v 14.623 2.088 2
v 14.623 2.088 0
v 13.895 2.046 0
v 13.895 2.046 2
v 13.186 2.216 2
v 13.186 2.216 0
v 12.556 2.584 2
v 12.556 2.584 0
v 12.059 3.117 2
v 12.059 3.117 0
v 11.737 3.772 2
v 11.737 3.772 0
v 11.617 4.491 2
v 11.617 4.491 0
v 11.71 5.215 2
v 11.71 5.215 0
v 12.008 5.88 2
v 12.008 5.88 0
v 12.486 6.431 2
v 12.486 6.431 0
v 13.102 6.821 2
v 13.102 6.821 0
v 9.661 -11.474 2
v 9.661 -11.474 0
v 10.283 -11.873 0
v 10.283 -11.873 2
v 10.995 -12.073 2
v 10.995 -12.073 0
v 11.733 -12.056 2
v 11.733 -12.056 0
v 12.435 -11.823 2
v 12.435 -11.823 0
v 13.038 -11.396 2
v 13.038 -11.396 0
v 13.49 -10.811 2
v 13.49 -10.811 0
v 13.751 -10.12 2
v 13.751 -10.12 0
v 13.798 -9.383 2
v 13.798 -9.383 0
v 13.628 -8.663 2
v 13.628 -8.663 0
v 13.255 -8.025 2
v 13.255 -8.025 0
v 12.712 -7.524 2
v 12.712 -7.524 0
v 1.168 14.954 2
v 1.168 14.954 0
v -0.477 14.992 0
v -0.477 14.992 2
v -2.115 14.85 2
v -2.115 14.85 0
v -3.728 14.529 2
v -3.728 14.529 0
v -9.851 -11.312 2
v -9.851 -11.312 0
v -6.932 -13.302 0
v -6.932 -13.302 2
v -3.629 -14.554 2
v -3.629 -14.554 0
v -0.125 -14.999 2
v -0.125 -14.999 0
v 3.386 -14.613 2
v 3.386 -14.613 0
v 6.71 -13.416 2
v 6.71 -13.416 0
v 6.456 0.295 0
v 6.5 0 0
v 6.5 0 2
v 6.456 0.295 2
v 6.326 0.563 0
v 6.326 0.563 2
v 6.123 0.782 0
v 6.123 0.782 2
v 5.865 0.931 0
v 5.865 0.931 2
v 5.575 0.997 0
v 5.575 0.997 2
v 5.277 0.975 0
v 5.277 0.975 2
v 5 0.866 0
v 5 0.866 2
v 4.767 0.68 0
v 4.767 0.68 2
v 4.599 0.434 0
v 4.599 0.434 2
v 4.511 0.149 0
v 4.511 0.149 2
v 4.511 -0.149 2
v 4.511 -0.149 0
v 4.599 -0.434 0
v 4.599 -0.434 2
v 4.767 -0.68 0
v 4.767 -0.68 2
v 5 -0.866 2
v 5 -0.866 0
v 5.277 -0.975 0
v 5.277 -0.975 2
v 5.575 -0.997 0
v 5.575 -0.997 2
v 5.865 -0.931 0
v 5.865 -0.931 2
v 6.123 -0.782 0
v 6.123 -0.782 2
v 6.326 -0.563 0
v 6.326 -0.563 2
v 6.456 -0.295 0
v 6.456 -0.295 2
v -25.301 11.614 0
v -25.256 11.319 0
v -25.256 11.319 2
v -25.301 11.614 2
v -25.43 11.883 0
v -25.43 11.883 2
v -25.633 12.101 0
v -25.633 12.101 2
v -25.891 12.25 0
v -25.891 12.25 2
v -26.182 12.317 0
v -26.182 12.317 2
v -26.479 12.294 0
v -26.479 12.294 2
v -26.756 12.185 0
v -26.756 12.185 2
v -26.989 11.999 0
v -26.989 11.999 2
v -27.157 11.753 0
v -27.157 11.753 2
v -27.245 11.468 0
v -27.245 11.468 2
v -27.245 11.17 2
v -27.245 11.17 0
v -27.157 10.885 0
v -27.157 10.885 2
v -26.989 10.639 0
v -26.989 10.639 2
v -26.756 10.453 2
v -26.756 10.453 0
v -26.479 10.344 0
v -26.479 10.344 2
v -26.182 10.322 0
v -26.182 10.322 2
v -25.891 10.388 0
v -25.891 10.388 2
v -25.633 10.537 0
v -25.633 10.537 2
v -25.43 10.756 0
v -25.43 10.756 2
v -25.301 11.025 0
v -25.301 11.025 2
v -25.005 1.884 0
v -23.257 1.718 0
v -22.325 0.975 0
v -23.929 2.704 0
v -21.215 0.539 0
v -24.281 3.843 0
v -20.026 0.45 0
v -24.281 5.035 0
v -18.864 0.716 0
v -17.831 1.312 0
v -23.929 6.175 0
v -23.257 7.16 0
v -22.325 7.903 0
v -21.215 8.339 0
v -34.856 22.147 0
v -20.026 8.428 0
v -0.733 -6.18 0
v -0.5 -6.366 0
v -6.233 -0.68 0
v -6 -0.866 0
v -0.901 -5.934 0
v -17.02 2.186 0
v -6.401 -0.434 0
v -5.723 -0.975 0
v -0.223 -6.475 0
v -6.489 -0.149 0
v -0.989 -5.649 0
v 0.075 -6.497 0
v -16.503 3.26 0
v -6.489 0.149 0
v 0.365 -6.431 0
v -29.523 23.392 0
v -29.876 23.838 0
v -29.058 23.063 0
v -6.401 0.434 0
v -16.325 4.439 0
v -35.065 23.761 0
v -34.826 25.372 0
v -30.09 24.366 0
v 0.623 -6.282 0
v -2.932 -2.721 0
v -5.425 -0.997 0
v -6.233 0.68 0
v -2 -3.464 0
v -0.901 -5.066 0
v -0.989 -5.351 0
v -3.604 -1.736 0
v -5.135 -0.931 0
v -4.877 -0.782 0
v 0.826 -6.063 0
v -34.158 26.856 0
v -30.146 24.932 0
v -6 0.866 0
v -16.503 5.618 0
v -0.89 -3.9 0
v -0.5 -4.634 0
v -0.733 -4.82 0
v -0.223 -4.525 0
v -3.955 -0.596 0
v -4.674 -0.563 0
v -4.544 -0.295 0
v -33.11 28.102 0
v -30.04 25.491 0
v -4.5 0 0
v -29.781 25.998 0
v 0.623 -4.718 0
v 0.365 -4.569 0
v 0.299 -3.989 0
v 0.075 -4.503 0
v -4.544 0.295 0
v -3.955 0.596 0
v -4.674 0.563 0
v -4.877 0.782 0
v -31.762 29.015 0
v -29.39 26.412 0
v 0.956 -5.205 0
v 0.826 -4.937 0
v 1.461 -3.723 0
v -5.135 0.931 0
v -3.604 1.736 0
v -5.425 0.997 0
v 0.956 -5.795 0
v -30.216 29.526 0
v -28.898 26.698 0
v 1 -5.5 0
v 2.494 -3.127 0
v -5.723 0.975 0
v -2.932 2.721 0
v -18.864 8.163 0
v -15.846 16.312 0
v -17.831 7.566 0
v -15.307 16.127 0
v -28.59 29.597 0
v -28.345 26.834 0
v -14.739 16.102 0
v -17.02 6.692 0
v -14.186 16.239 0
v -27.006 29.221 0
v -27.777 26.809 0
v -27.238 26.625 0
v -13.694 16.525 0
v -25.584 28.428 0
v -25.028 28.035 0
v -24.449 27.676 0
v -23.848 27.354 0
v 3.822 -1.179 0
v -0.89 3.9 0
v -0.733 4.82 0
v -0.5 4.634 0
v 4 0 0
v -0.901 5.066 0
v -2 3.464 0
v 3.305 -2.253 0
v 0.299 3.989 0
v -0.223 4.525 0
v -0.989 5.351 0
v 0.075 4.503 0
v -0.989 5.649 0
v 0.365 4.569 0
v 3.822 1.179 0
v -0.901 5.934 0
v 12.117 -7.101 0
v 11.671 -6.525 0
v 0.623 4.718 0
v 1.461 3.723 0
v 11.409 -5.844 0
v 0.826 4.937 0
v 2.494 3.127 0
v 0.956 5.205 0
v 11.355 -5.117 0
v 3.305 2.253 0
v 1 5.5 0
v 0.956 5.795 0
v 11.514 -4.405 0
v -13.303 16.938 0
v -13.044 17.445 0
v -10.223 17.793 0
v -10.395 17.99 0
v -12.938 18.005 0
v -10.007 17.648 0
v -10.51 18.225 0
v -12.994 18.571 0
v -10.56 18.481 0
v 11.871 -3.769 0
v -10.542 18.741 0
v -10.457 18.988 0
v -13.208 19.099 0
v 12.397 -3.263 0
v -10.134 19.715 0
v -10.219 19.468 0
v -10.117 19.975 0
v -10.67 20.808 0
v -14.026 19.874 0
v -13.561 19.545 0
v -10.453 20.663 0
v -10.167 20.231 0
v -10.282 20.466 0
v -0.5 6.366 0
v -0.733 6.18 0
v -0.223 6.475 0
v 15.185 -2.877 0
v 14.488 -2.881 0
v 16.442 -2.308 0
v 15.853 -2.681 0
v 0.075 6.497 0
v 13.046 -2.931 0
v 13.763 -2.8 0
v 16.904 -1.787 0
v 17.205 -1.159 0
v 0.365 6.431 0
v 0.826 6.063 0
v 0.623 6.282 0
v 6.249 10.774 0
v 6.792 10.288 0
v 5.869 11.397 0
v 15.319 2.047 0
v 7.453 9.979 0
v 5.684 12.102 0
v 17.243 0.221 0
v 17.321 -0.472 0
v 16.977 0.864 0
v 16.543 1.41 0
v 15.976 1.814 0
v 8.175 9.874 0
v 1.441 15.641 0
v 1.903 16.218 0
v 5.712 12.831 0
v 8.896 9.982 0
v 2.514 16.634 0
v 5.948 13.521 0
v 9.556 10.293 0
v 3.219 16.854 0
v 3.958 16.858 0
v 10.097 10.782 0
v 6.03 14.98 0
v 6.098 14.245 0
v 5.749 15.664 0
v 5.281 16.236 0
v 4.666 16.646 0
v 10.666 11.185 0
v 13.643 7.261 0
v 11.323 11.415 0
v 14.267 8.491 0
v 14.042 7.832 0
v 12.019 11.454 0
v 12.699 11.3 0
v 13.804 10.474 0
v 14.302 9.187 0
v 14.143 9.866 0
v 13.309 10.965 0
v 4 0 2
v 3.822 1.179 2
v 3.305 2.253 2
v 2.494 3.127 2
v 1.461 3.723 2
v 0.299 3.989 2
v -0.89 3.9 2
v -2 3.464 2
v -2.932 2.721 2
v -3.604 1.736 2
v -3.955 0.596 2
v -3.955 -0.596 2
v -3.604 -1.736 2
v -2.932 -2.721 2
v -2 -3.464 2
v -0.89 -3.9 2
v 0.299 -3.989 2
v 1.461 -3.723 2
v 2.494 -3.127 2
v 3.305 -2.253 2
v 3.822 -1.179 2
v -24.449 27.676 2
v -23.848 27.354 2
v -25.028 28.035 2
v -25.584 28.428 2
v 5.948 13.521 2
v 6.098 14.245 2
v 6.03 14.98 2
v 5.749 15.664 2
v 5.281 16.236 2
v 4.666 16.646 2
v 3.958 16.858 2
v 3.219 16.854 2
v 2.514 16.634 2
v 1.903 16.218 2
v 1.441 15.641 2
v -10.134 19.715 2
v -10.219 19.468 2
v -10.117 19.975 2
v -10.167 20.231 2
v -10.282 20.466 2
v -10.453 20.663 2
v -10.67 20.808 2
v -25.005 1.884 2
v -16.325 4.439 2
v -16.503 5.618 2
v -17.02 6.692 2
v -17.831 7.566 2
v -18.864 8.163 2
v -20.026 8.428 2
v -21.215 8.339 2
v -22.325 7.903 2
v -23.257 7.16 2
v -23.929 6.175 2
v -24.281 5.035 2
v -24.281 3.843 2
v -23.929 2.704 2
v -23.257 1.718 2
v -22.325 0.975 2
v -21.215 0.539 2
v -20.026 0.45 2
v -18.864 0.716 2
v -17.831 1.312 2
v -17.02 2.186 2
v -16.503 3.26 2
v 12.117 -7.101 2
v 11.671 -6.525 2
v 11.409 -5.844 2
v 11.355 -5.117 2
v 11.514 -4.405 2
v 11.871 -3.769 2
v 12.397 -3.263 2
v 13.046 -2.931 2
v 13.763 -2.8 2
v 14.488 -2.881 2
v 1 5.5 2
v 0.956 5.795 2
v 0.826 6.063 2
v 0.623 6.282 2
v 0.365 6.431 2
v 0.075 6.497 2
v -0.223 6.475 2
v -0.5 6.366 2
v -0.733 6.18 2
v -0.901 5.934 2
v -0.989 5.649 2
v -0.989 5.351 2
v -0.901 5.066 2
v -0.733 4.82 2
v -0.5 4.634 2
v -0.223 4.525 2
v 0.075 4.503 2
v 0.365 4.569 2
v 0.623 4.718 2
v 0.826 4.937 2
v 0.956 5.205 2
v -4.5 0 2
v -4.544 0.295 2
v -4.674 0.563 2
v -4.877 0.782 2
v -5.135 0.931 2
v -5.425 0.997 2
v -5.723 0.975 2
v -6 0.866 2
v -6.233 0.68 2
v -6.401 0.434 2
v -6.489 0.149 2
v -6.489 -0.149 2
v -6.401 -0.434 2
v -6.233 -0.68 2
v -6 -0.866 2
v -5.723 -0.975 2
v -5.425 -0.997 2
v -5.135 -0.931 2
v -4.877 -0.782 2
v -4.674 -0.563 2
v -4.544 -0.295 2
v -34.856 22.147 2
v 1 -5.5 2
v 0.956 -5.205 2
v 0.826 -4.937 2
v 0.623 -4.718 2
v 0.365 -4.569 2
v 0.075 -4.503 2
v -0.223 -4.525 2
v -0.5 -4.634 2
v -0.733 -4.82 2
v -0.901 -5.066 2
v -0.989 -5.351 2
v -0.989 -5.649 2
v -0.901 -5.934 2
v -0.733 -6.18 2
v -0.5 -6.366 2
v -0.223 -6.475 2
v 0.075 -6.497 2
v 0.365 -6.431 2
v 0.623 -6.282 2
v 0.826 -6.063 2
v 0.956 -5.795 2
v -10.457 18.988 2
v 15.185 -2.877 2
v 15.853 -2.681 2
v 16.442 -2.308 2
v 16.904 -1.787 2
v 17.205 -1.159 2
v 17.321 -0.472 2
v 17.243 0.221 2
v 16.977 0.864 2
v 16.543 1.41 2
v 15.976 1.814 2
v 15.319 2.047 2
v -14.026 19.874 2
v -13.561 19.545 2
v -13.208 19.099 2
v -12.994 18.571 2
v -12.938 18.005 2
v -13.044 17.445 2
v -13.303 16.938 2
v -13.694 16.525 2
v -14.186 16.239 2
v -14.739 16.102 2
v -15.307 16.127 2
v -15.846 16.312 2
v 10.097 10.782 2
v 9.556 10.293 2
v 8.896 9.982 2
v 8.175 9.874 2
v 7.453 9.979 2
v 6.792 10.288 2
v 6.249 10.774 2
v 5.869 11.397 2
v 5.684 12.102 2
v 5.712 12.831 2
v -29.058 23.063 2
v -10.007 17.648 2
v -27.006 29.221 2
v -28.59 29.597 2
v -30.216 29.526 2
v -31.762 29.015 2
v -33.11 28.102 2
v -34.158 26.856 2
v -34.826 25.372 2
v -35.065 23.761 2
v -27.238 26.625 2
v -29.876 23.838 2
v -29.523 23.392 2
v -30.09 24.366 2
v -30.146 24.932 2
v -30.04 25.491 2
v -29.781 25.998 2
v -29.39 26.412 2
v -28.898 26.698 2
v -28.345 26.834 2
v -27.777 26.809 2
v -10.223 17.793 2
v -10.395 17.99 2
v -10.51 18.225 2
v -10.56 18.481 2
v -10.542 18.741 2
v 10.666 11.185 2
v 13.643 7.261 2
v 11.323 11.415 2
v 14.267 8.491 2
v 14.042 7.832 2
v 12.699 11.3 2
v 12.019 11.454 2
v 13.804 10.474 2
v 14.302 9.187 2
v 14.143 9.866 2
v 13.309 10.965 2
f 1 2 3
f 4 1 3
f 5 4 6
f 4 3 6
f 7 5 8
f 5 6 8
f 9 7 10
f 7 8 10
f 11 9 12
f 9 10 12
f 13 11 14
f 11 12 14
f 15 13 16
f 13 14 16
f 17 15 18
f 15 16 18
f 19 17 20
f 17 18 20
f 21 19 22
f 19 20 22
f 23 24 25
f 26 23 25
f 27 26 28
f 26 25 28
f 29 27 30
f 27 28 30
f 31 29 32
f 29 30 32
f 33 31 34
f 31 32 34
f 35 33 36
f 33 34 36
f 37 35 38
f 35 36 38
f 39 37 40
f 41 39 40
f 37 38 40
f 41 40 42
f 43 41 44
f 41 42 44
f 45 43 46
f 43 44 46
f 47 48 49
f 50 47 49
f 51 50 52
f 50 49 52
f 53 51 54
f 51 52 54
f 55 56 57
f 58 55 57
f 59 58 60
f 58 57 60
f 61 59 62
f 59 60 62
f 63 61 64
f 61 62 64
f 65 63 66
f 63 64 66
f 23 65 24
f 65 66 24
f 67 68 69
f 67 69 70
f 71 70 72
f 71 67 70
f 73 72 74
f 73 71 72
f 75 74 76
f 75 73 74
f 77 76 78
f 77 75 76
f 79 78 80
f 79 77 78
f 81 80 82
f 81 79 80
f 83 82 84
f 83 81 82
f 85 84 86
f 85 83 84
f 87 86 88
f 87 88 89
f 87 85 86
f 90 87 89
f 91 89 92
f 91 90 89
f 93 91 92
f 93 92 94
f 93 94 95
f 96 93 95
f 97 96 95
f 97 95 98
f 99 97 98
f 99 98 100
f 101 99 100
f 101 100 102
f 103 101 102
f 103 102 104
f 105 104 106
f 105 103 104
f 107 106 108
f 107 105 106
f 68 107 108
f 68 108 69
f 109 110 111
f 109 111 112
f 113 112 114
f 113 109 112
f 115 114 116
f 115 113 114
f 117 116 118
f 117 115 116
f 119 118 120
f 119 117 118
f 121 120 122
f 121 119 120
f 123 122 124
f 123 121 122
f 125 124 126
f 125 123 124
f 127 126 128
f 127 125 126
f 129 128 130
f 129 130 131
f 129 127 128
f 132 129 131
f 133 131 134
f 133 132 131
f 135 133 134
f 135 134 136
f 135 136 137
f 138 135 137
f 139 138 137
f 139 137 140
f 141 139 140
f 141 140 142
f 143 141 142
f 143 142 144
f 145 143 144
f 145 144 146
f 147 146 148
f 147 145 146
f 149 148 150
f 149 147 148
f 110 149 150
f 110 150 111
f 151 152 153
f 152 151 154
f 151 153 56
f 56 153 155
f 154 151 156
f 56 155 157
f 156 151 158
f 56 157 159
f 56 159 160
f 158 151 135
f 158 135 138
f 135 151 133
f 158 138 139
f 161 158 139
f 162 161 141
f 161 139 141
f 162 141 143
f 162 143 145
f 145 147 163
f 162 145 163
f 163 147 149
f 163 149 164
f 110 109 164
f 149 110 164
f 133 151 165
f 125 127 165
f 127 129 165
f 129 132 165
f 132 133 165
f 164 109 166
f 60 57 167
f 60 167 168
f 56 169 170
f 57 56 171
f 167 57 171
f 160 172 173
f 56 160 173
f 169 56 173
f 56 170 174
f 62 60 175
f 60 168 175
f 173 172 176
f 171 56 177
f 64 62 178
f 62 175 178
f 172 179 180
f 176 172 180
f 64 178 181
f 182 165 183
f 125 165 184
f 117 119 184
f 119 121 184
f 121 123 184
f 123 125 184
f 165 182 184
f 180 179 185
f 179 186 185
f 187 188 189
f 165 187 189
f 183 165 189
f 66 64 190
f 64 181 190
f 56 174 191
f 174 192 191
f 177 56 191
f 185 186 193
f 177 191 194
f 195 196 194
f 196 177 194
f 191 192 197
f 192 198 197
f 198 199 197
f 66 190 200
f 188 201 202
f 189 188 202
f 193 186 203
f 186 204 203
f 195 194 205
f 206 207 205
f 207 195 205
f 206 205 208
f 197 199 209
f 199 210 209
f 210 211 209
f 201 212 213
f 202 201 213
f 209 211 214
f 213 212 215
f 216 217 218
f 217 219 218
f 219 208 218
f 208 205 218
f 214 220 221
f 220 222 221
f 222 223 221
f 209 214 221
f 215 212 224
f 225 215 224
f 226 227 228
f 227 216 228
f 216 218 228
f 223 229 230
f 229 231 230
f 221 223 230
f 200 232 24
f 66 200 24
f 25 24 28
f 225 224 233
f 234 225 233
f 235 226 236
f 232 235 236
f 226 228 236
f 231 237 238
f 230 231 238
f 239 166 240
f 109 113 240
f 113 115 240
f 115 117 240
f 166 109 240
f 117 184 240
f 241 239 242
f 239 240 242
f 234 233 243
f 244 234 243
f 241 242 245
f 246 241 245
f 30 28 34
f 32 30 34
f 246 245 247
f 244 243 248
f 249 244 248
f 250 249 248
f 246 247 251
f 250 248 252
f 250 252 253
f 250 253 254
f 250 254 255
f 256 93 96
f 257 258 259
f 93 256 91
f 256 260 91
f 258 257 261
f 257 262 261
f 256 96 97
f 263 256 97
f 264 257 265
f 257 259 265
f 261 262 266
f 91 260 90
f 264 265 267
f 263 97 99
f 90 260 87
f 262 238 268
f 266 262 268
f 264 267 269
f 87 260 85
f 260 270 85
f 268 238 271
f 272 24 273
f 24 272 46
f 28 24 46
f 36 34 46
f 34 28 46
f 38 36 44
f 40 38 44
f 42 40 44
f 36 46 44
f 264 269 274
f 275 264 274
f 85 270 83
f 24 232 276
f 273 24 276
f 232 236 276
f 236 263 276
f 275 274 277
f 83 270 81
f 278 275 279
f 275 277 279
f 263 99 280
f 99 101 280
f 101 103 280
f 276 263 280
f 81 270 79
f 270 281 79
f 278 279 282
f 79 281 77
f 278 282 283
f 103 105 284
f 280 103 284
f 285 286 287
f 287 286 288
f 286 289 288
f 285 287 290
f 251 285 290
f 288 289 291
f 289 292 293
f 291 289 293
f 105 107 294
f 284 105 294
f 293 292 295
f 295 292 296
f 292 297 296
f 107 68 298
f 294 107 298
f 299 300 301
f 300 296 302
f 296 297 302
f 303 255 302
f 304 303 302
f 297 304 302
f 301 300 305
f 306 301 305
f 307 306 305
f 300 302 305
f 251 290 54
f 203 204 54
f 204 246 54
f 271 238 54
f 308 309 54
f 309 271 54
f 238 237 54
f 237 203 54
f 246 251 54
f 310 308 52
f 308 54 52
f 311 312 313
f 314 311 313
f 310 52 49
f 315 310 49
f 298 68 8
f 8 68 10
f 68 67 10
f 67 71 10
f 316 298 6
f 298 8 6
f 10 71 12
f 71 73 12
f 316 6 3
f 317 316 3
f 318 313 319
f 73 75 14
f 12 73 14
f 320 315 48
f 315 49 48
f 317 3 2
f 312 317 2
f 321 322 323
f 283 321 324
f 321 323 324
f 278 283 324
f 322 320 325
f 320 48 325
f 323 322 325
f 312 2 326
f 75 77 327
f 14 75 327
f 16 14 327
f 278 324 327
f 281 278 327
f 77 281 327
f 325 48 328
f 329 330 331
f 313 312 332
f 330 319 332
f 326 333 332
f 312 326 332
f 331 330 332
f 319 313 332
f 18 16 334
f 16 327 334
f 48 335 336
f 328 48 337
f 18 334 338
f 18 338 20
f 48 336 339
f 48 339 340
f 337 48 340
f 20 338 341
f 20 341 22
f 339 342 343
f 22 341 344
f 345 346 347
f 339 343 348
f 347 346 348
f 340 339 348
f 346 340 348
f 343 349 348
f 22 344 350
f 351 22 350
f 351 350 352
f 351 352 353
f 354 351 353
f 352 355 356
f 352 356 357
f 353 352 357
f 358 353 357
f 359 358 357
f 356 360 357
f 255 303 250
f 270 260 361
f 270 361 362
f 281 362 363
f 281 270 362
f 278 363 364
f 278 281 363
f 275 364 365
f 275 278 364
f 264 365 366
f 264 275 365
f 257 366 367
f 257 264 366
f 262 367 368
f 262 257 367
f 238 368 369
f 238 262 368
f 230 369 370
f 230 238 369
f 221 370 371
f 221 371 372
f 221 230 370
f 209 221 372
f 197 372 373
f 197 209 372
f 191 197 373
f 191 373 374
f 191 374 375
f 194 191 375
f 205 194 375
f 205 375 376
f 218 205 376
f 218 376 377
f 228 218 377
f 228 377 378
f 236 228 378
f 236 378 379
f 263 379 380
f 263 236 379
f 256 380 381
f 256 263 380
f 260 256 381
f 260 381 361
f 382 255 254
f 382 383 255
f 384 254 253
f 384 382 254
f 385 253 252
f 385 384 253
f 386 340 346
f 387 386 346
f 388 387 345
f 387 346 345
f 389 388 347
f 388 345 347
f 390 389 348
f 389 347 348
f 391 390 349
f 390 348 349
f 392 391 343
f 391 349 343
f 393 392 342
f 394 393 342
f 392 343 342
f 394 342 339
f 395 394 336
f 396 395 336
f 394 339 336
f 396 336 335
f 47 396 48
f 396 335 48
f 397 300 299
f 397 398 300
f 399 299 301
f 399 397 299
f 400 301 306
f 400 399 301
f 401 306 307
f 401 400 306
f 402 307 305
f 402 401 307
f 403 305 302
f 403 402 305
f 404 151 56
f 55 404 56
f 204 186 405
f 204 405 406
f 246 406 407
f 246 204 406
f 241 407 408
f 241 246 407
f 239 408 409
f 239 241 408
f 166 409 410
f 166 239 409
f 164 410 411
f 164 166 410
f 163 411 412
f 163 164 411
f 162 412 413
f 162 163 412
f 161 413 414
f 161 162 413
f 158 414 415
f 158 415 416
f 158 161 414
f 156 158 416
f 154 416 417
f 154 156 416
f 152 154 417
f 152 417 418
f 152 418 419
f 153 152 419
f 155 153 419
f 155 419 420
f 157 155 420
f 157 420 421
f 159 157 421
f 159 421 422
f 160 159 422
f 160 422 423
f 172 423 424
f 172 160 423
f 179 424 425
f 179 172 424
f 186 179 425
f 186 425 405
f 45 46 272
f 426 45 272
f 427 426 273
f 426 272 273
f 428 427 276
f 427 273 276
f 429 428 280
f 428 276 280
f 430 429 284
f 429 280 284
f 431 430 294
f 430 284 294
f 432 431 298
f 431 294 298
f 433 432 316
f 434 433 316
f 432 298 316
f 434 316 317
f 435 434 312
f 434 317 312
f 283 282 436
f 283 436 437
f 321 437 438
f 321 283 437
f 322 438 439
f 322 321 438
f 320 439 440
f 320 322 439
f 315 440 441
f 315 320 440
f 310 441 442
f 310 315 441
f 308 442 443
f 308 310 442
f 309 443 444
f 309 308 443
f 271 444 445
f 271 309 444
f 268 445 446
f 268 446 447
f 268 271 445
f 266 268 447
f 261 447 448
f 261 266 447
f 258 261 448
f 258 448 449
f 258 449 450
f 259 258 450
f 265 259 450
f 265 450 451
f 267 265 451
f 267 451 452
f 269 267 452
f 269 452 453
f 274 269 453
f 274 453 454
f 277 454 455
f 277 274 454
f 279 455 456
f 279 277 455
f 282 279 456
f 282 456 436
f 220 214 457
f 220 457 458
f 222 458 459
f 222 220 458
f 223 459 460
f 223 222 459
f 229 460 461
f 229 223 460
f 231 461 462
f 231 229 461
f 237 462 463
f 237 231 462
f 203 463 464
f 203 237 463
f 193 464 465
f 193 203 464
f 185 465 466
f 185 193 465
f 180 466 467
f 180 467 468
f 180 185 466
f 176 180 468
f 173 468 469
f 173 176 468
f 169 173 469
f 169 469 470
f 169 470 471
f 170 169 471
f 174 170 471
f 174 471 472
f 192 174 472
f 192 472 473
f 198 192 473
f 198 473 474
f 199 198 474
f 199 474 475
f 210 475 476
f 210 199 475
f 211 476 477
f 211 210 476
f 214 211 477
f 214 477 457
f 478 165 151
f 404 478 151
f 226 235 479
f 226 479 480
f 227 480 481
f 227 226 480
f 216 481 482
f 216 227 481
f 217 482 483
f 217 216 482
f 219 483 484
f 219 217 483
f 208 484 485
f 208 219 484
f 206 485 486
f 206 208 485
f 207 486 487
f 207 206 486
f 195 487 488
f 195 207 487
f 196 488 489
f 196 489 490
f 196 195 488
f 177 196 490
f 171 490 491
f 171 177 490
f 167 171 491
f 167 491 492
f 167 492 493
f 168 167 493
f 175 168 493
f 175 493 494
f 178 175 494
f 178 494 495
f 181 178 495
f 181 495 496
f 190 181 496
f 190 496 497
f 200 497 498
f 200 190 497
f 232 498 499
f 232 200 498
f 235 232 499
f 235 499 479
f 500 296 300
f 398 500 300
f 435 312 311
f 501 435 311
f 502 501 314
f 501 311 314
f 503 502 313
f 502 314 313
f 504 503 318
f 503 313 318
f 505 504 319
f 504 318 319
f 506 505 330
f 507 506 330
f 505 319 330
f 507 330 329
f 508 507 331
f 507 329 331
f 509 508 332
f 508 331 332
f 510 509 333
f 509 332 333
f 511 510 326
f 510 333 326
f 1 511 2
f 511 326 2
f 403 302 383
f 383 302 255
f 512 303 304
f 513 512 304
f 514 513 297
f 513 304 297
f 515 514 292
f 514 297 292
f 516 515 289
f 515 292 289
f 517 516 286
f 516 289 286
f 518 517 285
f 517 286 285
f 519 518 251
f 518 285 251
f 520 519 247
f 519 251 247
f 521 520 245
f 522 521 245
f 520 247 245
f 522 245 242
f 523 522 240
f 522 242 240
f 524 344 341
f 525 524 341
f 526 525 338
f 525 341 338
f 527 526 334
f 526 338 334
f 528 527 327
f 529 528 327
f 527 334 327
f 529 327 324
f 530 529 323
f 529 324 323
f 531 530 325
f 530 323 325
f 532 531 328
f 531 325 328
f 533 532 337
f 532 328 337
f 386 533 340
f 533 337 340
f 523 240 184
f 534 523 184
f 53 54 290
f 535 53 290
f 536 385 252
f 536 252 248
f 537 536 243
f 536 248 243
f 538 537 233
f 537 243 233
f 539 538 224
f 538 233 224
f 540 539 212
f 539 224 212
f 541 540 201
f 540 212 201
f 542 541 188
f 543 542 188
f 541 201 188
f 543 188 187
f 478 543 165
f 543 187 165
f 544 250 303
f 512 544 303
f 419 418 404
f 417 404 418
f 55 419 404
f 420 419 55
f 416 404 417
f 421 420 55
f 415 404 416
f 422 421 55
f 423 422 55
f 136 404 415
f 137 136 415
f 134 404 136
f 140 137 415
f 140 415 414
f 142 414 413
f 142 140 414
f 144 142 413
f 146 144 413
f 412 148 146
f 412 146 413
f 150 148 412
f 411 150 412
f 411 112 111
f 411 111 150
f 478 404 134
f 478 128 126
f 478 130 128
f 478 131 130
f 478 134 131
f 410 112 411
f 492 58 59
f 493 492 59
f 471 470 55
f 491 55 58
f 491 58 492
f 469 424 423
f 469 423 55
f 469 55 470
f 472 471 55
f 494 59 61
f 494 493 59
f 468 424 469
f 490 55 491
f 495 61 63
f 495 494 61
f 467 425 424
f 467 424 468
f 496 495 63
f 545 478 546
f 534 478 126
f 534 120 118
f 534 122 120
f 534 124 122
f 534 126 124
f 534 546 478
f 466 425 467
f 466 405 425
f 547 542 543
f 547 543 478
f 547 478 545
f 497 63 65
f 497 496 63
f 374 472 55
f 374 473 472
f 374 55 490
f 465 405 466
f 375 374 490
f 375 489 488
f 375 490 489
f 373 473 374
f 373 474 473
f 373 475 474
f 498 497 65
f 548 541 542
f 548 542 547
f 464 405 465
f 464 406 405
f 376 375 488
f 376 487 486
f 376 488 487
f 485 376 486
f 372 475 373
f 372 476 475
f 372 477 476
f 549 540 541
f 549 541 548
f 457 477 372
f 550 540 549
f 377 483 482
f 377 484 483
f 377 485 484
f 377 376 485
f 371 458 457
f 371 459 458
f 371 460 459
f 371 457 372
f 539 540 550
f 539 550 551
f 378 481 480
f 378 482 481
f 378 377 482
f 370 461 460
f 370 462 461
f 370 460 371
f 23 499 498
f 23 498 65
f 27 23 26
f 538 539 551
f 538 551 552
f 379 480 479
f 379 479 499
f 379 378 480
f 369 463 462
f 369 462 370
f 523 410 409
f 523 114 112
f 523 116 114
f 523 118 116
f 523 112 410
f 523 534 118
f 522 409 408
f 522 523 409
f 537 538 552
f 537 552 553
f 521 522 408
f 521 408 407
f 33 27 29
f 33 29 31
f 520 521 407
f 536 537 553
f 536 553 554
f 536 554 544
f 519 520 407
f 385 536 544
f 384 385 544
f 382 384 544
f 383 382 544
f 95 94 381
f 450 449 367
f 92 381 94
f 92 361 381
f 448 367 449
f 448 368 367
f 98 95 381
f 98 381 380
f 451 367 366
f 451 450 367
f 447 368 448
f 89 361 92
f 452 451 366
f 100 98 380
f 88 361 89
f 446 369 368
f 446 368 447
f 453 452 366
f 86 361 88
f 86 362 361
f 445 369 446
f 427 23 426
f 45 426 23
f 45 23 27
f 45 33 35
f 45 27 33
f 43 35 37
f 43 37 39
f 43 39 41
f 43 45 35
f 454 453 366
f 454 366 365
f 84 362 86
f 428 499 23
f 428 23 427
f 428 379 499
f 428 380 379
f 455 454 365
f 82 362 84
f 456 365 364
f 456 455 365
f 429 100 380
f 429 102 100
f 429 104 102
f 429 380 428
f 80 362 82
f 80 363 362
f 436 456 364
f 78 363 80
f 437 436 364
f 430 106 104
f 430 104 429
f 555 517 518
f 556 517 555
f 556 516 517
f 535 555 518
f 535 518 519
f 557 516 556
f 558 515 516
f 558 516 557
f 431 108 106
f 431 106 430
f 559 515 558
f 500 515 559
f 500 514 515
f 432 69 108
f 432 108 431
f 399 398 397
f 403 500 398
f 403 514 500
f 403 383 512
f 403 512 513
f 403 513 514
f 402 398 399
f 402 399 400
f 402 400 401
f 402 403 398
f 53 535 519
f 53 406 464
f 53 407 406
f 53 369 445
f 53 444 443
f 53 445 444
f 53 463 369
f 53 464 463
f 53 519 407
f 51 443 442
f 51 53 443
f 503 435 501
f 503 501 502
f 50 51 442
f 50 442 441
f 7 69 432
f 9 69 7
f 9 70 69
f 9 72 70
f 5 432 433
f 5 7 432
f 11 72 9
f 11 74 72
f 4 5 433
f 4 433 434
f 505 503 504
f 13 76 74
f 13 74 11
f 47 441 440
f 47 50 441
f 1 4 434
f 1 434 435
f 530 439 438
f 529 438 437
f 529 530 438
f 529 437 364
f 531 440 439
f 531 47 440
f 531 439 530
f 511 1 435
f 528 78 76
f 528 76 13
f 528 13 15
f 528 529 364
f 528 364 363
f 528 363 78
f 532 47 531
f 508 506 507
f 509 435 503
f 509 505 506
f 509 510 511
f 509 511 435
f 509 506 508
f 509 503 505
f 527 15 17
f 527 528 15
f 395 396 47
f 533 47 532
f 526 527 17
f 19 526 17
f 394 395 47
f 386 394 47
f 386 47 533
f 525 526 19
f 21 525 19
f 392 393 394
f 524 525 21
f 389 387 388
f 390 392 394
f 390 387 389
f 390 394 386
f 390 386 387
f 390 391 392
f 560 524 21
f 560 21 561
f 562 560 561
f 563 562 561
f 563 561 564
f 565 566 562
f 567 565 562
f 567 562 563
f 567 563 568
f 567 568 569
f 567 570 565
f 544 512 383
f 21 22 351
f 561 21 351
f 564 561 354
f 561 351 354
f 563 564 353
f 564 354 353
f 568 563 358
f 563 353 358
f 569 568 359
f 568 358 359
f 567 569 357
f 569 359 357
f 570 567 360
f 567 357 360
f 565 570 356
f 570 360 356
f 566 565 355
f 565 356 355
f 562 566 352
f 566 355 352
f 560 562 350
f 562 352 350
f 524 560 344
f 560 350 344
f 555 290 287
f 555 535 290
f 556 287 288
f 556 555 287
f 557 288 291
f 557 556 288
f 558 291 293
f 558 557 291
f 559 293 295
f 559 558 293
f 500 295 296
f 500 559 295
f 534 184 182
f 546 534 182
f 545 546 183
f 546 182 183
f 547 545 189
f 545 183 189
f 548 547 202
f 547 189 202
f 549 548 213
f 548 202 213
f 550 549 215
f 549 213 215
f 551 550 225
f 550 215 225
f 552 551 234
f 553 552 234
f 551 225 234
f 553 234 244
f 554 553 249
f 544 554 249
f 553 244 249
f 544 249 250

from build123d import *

# Parameters (mm, degrees)
ESQUISSE1_R        = 4
ESQUISSE1_R_2      = 1
BOSS_EXTRU_1_DEPTH = 2
CONG_1_R           = 1
CONG_2_R           = 11


with BuildPart() as part:
    # Esquisse1 → Boss.-Extru.1 (new body)
    with BuildSketch(Plane.XY):
        with BuildLine():
            Line((-3.728432128, 14.529239273), (-10.902133324, 18.092613259))
            Line((-10.902133324, 18.092613259), (-9.77414371, 20.363455577))
            Line((-9.77414371, 20.363455577), (-25.005281494, 27.929179137))
            ThreePointArc((-25.005281494, 27.929179137), (-32.144223962, 28.809157948), (-34.856074883, 22.146971607))
            Line((-34.856074883, 22.146971607), (-25.005281494, 1.884444499))
            Line((-25.005281494, 1.884444499), (-9.850606554, -11.31218593))
            ThreePointArc((-9.850606554, -11.31218593), (-0.12474397, -14.999481289), (9.661100255, -11.47445606))
            ThreePointArc((9.661100255, -11.47445606), (13.285456142, -11.120563185), (12.711512496, -7.524484146))
            ThreePointArc((12.711512496, -7.524484146), (11.513856086, -4.40486723), (14.487891216, -2.881218443))
            ThreePointArc((14.487891216, -2.881218443), (17.321259352, -0.471730027), (14.623234656, 2.088401251))
            ThreePointArc((14.623234656, 2.088401251), (11.736537034, 3.771662198), (13.102212542, 6.821468911))
            ThreePointArc((13.102212542, 6.821468911), (13.803708164, 10.474072546), (10.097110191, 10.781872629))
            ThreePointArc((10.097110191, 10.781872629), (6.792233583, 10.287725708), (5.948313856, 13.521019705))
            ThreePointArc((5.948313856, 13.521019705), (4.31988032, 16.778227095), (1.167882396, 14.954465912))
            ThreePointArc((1.167882396, 14.954465912), (-1.297808983, 14.94375093), (-3.728432128, 14.529239273))
        make_face()
        with Locations((-20.325227829, 4.439090716)):
            Circle(ESQUISSE1_R, mode=Mode.SUBTRACT)
        with Locations((-26.256387143, 11.319323515)):
            Circle(ESQUISSE1_R_2, mode=Mode.SUBTRACT)
        with BuildLine():
            ThreePointArc((-29.058075564, 23.063121212), (-29.928943128, 25.754141406), (-27.237922934, 26.625008971))
            Line((-27.237922934, 26.625008971), (-14.025891569, 19.873557138))
            ThreePointArc((-14.025891569, 19.873557138), (-13.155024005, 17.182536944), (-15.846044199, 16.31166938))
            Line((-15.846044199, 16.31166938), (-29.058075564, 23.063121212))
        make_face(mode=Mode.SUBTRACT)
        with Locations((5.5, 0)):
            Circle(ESQUISSE1_R_2, mode=Mode.SUBTRACT)
        with Locations((0, -5.5)):
            Circle(ESQUISSE1_R_2, mode=Mode.SUBTRACT)
        with Locations((-5.5, 0)):
            Circle(ESQUISSE1_R_2, mode=Mode.SUBTRACT)
        Circle(ESQUISSE1_R, mode=Mode.SUBTRACT)
        with Locations((0, 5.5)):
            Circle(ESQUISSE1_R_2, mode=Mode.SUBTRACT)
    extrude(amount=BOSS_EXTRU_1_DEPTH)

    # Congé1
    cong_1_edges = [part.edges().sort_by_distance(p)[0] for p in [
        (-9.77414371, 20.363455577, 1),
        (-10.902133324, 18.092613259, 1),
    ]]
    fillet(cong_1_edges, radius=CONG_1_R)

    # Congé2
    cong_2_edges = [part.edges().sort_by_distance(p)[0] for p in [
        (-25.005281494, 27.929179137, 1),
    ]]
    fillet(cong_2_edges, radius=CONG_2_R)


solid = part.part
